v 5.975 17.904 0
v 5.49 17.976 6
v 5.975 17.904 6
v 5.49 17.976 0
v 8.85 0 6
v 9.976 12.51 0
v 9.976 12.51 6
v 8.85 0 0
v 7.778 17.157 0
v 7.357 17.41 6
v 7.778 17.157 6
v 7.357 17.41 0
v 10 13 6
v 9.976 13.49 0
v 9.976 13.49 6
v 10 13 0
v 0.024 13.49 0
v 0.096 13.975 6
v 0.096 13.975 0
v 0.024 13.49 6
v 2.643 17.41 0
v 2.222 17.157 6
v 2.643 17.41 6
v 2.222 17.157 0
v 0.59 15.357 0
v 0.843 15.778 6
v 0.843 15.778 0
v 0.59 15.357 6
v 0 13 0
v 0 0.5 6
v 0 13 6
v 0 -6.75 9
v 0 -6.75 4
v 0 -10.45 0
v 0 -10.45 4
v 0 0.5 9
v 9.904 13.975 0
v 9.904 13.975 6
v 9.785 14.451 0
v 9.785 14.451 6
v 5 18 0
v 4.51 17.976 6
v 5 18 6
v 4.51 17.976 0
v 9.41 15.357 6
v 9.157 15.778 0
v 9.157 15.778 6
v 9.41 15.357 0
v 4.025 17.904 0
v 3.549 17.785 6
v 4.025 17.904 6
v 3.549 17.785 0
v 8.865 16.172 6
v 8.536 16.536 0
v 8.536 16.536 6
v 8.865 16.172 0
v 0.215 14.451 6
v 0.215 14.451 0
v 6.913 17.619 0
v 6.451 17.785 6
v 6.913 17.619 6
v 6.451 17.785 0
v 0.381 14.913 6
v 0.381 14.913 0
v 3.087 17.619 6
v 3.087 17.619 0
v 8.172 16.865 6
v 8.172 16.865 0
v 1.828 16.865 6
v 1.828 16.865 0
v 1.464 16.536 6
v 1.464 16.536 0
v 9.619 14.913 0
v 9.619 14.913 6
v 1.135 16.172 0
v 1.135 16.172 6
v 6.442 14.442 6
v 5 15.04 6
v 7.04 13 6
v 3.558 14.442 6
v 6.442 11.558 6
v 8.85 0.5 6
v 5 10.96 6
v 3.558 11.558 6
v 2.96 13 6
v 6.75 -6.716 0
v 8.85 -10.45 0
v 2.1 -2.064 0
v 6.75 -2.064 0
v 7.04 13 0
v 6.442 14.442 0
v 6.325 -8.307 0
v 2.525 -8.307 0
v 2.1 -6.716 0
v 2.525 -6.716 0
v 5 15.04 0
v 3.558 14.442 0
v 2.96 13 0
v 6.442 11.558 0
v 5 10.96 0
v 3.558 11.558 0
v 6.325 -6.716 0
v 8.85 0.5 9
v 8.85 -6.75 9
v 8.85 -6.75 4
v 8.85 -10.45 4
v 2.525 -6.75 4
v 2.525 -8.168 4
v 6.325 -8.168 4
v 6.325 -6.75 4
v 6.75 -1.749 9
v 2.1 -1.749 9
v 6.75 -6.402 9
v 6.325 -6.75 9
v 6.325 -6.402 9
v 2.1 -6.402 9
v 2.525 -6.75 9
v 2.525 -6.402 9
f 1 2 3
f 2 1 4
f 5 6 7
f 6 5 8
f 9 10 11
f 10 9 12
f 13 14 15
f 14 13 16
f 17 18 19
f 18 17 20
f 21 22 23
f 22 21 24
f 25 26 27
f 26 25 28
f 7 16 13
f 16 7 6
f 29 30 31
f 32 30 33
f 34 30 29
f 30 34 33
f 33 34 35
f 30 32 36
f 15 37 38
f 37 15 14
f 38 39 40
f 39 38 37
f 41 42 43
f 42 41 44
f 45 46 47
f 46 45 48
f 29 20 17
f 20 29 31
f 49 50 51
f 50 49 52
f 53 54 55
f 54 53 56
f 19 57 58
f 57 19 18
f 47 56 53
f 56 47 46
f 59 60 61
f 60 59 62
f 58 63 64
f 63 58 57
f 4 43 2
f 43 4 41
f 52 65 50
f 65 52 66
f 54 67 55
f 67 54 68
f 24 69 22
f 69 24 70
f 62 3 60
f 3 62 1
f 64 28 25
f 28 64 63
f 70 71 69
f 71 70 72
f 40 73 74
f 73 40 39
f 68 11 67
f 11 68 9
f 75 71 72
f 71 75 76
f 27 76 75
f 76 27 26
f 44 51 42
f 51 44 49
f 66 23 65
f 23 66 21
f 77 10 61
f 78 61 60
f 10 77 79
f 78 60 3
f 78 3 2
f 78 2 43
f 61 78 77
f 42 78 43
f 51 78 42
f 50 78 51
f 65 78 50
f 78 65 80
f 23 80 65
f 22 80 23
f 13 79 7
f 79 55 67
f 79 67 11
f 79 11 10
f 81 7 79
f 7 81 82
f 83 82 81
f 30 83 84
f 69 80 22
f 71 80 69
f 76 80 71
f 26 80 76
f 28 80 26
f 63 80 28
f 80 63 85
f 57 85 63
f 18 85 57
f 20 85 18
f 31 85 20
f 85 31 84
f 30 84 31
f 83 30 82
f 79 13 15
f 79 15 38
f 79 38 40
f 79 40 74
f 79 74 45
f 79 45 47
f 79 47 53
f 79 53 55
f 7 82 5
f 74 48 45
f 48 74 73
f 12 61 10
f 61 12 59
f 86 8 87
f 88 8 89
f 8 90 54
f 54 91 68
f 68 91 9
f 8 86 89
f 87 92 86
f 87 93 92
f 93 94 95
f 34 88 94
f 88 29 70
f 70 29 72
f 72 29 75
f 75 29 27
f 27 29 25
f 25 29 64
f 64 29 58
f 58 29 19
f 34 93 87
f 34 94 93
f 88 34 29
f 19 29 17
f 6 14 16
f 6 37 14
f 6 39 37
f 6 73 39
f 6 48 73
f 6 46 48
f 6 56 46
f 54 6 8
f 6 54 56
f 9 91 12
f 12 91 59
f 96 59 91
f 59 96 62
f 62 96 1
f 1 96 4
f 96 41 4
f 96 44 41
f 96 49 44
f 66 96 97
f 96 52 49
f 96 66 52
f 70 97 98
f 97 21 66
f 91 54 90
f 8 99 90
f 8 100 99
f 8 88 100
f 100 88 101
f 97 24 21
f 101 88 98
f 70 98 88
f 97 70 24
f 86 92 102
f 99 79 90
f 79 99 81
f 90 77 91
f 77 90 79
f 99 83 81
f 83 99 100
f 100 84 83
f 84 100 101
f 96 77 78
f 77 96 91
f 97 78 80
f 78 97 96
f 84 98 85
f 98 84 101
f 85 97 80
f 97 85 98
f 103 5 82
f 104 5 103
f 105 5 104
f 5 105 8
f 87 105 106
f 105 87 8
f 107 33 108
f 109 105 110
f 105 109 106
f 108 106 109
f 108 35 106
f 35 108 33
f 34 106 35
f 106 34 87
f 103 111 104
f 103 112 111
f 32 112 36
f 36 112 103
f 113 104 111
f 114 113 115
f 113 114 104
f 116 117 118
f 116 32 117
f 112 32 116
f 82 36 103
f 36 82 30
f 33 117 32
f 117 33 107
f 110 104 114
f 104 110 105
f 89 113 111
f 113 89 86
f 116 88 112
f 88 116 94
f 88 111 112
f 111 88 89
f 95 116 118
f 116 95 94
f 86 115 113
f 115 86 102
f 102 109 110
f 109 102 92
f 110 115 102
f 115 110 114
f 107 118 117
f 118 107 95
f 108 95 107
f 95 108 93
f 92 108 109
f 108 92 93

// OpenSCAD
// file: ../library/m3_parts.scad
// m3_parts.scad - A collection of things useful when developing with M3 fasteners
// (c)2025 vik@diamondage.co.nz, released under the GPL V3 or later

m3_screw_rad=3.4/2; // M3 screw hole radius
m3_screw_head_rad=5.9/2;    // Radius of the average M3 posi screw head
m3_screw_head_height=2.4;
m3_nut_max_width=6.4;     // M3 Nut from point to point.
m3_pillar_max_width=5.9;    // M3 pillar width, point to point
m3_nut_height=2.5;
m3_nut_min_width=5.8;  // Nut from flat to flat

// NEMA17 motors are *technically* M3 parts...
nema17_screw_sep=31;
nema17_collar_rad=22.5/2;   // The raised collar around the NEMA output shaft
nema17_face_len=42;         // Length of the square face of a NEMA17 ignoring bevels

// Cavity for M3 nut that goes into the top of things. Slight overshoot to avoid booleans
module m3_nut_cavity(ht=m3_nut_height) {
    translate([0,0,0.01]) cylinder(h=ht+0.01,r=m3_nut_max_width/2,$fn=6);
}

// A nut cavity for putting underneath things, with a nod to overhangs
// Has a conical top to print without support. Projects very slightly down to remove boolean issues.
// Making it captive adds little bumps inside that make it hard to insert and remove the nut
module m3_nut_cavity_tapered(captive=false) {
    difference() {
        union() {
            // Tapered avity for m3 nut
            translate([0,0,-0.01]) cylinder(h=m3_nut_height+0.01,r=m3_nut_max_width/2,$fn=6);
            translate([0,0,m3_nut_height])
                cylinder(h=1,r1=m3_nut_max_width/2,r2=m3_screw_rad*1.2,$fn=6);
        }
        if (captive) {
            divot_rad=0.4;
            rotate([0,0,30]) translate([m3_nut_max_width*0.42,0,m3_nut_height/2])
                sphere(divot_rad);
            rotate([0,0,30+120]) translate([m3_nut_max_width*0.42,0,m3_nut_height/2])
                sphere(divot_rad);
            rotate([0,0,30-120]) translate([m3_nut_max_width*0.42,0,m3_nut_height/2])
                sphere(divot_rad);

        }
    }
}

// Nut  slot for M3 nut
module m3_nut_slot(l=100) {
    difference() {
        // Long slot
        translate([-m3_nut_max_width/2,-m3_nut_min_width/2,0])
            cube([m3_nut_max_width+l,m3_nut_min_width,m3_nut_height]);
        // Small knobs to retain nut
        translate([0.2,m3_nut_min_width/2,m3_nut_height/2]) sphere(0.5);
        translate([0.2,-m3_nut_min_width/2,m3_nut_height/2]) sphere(0.5);
    }
}

// Cavity for an M3 screw and screw head of specified length.
// Points down. Uses octagons so that it can be printed horizontally
module  m3_screw_cavity(screw_len,inverted=false) {
    difference() {
        // The screw hole and head assembly
        union() {
            rotate([180,0,360/16]) cylinder(h=screw_len,r=m3_screw_rad*1.2,$fn=8);
            // Rotate to make hole's flats parallel to axes. Tiny shift to fix booleans
            rotate([0,0,360/16]) translate([0,0,-0.001])
                cylinder(h=10,r=m3_screw_head_rad*1.2,$fn=8);
        }
        // If it's inverted, put a hollow cylinder in the head cavity lined up with the screw
       // hole as support. Stand off a bit so that it iwll separate cleanly.
        if (inverted) {
            translate([0,0.2]) rotate([0,0,360/16]) {
                // Hollow cylinder, extended downwards for a screwdriver shaft
                extend_downwards=100;
                translate([0,0,-extend_downwards]) difference() {
                    cylinder(h=screw_len+extend_downwards,r=m3_screw_rad*1.2+0.3,$fn=8);
                    cylinder(h=(screw_len+extend_downwards)*3,r=m3_screw_rad*1.2,$fn=8,center=true);
                }
            }
        }
    }
}


// Octagonal hole for screw, no head, centred, length extends up and down
module  m3_screw_hole(screw_len) {
    rotate([180,0,360/16]) cylinder(h=screw_len,r=m3_screw_rad*1.2,$fn=8,center=true);
}

m3_thumbscrew_height=5;
m3_thumbscrew_rad=5;
// Thumbscrew with ridges. Screw head fits in top depression, nut on screw
// shaft holds it in place.
//  rad: Optional radius for thumbscrew knob (default 5, see above)
module m3_thumbscrew_knob(rad=m3_thumbscrew_rad) {
    m3_thumbscrew_ridges=floor(rad*3.2);
    difference() {
        union() {
            for (i=[0:m3_thumbscrew_ridges]) rotate([0,0,360/m3_thumbscrew_ridges*i])
                translate([rad,0,m3_thumbscrew_height/2])
                    cube([1,1,m3_thumbscrew_height],center=true);
            cylinder(h=m3_thumbscrew_height,r=rad);
            translate([0,0,m3_thumbscrew_height])
                cylinder(m3_nut_height,r1=rad,r2=m3_nut_max_width/2+1);
        }
        translate([0,0,m3_thumbscrew_height]) m3_nut_cavity();
        translate([0,0,m3_screw_head_height]) rotate([180,0,0])
            m3_screw_cavity(m3_thumbscrew_height+m3_nut_height+1,inverted=true);
    }
}
// main file
// optic_probe_holder.scad -Holds a standard 125/9 fibre optic connector on a PIKA Probe Arm
// (c)2026 vik@olliver.fsmily.gen.nz GPLV3 or later applies

include <../library/m3_parts.scad>

// A square fibre optic connector socket, height = very big.
plug_square=4.65;    // It's a square cross-section plug this buig
tab_width=3.8;  // Dimensions of tab on side of optical plug.
tab_ht=1.6;
// Make sure the socket will be big enough to hold the tab
fibre_socket_square=plug_square+2*tab_ht+1;
fibre_socket_deep=4;   // Depth of the socket. Note this controlls the height of the probe tip.

// Holds the optical fibre plug.
// Needs to lean a bit because the probe arm pivots down.
module fibre_socket() {
    verybig=999;
    rotate([-2,0,0]) translate([0,0,verybig/2]) {
        // Hole for fibre
        cube([plug_square,plug_square,verybig],center=true);
        // Slot for the tab on it.
        translate([0,0.01-(plug_square+tab_ht)/2,0]) cube([tab_width,tab_ht,verybig],center=true);
    }
}

// Perforated tab used to hold the fleures etc. to the Z Axis Driver's Probe Arm
tab_rad=10/2;
tab_thick=6;
handle_depth=8;    // Handle sticks out this much.

 module attachment_tab(thickness=tab_thick) {
    difference() {
        hull() {
            // Nice, smooth transition to the handle
            translate([tab_rad,handle_depth+tab_rad,0]) cylinder(h=thickness,r=tab_rad,$fn=64);
            cube([fibre_socket_square,tab_thick,thickness]);
        }
        // Perforate for a screw
        translate([tab_rad,handle_depth+tab_rad,0]) rotate([0,0,180/8])
            m3_screw_hole(thickness*3);
    }
}

support_ht=9;
attachment_tab();
translate([0,-fibre_socket_square,0]) difference() {
    union() {
        // Supportive bit for fibre connector
        translate([0,-tab_ht,0]) cube([fibre_socket_square,fibre_socket_square+tab_ht,fibre_socket_deep]);
        // This bit does not crowd the tab
        translate([0,(fibre_socket_square-plug_square)/2,0])
            cube([fibre_socket_square,fibre_socket_square-tab_ht,support_ht]);
    }
    translate([fibre_socket_square/2,fibre_socket_square/2,-1]) fibre_socket();
}
